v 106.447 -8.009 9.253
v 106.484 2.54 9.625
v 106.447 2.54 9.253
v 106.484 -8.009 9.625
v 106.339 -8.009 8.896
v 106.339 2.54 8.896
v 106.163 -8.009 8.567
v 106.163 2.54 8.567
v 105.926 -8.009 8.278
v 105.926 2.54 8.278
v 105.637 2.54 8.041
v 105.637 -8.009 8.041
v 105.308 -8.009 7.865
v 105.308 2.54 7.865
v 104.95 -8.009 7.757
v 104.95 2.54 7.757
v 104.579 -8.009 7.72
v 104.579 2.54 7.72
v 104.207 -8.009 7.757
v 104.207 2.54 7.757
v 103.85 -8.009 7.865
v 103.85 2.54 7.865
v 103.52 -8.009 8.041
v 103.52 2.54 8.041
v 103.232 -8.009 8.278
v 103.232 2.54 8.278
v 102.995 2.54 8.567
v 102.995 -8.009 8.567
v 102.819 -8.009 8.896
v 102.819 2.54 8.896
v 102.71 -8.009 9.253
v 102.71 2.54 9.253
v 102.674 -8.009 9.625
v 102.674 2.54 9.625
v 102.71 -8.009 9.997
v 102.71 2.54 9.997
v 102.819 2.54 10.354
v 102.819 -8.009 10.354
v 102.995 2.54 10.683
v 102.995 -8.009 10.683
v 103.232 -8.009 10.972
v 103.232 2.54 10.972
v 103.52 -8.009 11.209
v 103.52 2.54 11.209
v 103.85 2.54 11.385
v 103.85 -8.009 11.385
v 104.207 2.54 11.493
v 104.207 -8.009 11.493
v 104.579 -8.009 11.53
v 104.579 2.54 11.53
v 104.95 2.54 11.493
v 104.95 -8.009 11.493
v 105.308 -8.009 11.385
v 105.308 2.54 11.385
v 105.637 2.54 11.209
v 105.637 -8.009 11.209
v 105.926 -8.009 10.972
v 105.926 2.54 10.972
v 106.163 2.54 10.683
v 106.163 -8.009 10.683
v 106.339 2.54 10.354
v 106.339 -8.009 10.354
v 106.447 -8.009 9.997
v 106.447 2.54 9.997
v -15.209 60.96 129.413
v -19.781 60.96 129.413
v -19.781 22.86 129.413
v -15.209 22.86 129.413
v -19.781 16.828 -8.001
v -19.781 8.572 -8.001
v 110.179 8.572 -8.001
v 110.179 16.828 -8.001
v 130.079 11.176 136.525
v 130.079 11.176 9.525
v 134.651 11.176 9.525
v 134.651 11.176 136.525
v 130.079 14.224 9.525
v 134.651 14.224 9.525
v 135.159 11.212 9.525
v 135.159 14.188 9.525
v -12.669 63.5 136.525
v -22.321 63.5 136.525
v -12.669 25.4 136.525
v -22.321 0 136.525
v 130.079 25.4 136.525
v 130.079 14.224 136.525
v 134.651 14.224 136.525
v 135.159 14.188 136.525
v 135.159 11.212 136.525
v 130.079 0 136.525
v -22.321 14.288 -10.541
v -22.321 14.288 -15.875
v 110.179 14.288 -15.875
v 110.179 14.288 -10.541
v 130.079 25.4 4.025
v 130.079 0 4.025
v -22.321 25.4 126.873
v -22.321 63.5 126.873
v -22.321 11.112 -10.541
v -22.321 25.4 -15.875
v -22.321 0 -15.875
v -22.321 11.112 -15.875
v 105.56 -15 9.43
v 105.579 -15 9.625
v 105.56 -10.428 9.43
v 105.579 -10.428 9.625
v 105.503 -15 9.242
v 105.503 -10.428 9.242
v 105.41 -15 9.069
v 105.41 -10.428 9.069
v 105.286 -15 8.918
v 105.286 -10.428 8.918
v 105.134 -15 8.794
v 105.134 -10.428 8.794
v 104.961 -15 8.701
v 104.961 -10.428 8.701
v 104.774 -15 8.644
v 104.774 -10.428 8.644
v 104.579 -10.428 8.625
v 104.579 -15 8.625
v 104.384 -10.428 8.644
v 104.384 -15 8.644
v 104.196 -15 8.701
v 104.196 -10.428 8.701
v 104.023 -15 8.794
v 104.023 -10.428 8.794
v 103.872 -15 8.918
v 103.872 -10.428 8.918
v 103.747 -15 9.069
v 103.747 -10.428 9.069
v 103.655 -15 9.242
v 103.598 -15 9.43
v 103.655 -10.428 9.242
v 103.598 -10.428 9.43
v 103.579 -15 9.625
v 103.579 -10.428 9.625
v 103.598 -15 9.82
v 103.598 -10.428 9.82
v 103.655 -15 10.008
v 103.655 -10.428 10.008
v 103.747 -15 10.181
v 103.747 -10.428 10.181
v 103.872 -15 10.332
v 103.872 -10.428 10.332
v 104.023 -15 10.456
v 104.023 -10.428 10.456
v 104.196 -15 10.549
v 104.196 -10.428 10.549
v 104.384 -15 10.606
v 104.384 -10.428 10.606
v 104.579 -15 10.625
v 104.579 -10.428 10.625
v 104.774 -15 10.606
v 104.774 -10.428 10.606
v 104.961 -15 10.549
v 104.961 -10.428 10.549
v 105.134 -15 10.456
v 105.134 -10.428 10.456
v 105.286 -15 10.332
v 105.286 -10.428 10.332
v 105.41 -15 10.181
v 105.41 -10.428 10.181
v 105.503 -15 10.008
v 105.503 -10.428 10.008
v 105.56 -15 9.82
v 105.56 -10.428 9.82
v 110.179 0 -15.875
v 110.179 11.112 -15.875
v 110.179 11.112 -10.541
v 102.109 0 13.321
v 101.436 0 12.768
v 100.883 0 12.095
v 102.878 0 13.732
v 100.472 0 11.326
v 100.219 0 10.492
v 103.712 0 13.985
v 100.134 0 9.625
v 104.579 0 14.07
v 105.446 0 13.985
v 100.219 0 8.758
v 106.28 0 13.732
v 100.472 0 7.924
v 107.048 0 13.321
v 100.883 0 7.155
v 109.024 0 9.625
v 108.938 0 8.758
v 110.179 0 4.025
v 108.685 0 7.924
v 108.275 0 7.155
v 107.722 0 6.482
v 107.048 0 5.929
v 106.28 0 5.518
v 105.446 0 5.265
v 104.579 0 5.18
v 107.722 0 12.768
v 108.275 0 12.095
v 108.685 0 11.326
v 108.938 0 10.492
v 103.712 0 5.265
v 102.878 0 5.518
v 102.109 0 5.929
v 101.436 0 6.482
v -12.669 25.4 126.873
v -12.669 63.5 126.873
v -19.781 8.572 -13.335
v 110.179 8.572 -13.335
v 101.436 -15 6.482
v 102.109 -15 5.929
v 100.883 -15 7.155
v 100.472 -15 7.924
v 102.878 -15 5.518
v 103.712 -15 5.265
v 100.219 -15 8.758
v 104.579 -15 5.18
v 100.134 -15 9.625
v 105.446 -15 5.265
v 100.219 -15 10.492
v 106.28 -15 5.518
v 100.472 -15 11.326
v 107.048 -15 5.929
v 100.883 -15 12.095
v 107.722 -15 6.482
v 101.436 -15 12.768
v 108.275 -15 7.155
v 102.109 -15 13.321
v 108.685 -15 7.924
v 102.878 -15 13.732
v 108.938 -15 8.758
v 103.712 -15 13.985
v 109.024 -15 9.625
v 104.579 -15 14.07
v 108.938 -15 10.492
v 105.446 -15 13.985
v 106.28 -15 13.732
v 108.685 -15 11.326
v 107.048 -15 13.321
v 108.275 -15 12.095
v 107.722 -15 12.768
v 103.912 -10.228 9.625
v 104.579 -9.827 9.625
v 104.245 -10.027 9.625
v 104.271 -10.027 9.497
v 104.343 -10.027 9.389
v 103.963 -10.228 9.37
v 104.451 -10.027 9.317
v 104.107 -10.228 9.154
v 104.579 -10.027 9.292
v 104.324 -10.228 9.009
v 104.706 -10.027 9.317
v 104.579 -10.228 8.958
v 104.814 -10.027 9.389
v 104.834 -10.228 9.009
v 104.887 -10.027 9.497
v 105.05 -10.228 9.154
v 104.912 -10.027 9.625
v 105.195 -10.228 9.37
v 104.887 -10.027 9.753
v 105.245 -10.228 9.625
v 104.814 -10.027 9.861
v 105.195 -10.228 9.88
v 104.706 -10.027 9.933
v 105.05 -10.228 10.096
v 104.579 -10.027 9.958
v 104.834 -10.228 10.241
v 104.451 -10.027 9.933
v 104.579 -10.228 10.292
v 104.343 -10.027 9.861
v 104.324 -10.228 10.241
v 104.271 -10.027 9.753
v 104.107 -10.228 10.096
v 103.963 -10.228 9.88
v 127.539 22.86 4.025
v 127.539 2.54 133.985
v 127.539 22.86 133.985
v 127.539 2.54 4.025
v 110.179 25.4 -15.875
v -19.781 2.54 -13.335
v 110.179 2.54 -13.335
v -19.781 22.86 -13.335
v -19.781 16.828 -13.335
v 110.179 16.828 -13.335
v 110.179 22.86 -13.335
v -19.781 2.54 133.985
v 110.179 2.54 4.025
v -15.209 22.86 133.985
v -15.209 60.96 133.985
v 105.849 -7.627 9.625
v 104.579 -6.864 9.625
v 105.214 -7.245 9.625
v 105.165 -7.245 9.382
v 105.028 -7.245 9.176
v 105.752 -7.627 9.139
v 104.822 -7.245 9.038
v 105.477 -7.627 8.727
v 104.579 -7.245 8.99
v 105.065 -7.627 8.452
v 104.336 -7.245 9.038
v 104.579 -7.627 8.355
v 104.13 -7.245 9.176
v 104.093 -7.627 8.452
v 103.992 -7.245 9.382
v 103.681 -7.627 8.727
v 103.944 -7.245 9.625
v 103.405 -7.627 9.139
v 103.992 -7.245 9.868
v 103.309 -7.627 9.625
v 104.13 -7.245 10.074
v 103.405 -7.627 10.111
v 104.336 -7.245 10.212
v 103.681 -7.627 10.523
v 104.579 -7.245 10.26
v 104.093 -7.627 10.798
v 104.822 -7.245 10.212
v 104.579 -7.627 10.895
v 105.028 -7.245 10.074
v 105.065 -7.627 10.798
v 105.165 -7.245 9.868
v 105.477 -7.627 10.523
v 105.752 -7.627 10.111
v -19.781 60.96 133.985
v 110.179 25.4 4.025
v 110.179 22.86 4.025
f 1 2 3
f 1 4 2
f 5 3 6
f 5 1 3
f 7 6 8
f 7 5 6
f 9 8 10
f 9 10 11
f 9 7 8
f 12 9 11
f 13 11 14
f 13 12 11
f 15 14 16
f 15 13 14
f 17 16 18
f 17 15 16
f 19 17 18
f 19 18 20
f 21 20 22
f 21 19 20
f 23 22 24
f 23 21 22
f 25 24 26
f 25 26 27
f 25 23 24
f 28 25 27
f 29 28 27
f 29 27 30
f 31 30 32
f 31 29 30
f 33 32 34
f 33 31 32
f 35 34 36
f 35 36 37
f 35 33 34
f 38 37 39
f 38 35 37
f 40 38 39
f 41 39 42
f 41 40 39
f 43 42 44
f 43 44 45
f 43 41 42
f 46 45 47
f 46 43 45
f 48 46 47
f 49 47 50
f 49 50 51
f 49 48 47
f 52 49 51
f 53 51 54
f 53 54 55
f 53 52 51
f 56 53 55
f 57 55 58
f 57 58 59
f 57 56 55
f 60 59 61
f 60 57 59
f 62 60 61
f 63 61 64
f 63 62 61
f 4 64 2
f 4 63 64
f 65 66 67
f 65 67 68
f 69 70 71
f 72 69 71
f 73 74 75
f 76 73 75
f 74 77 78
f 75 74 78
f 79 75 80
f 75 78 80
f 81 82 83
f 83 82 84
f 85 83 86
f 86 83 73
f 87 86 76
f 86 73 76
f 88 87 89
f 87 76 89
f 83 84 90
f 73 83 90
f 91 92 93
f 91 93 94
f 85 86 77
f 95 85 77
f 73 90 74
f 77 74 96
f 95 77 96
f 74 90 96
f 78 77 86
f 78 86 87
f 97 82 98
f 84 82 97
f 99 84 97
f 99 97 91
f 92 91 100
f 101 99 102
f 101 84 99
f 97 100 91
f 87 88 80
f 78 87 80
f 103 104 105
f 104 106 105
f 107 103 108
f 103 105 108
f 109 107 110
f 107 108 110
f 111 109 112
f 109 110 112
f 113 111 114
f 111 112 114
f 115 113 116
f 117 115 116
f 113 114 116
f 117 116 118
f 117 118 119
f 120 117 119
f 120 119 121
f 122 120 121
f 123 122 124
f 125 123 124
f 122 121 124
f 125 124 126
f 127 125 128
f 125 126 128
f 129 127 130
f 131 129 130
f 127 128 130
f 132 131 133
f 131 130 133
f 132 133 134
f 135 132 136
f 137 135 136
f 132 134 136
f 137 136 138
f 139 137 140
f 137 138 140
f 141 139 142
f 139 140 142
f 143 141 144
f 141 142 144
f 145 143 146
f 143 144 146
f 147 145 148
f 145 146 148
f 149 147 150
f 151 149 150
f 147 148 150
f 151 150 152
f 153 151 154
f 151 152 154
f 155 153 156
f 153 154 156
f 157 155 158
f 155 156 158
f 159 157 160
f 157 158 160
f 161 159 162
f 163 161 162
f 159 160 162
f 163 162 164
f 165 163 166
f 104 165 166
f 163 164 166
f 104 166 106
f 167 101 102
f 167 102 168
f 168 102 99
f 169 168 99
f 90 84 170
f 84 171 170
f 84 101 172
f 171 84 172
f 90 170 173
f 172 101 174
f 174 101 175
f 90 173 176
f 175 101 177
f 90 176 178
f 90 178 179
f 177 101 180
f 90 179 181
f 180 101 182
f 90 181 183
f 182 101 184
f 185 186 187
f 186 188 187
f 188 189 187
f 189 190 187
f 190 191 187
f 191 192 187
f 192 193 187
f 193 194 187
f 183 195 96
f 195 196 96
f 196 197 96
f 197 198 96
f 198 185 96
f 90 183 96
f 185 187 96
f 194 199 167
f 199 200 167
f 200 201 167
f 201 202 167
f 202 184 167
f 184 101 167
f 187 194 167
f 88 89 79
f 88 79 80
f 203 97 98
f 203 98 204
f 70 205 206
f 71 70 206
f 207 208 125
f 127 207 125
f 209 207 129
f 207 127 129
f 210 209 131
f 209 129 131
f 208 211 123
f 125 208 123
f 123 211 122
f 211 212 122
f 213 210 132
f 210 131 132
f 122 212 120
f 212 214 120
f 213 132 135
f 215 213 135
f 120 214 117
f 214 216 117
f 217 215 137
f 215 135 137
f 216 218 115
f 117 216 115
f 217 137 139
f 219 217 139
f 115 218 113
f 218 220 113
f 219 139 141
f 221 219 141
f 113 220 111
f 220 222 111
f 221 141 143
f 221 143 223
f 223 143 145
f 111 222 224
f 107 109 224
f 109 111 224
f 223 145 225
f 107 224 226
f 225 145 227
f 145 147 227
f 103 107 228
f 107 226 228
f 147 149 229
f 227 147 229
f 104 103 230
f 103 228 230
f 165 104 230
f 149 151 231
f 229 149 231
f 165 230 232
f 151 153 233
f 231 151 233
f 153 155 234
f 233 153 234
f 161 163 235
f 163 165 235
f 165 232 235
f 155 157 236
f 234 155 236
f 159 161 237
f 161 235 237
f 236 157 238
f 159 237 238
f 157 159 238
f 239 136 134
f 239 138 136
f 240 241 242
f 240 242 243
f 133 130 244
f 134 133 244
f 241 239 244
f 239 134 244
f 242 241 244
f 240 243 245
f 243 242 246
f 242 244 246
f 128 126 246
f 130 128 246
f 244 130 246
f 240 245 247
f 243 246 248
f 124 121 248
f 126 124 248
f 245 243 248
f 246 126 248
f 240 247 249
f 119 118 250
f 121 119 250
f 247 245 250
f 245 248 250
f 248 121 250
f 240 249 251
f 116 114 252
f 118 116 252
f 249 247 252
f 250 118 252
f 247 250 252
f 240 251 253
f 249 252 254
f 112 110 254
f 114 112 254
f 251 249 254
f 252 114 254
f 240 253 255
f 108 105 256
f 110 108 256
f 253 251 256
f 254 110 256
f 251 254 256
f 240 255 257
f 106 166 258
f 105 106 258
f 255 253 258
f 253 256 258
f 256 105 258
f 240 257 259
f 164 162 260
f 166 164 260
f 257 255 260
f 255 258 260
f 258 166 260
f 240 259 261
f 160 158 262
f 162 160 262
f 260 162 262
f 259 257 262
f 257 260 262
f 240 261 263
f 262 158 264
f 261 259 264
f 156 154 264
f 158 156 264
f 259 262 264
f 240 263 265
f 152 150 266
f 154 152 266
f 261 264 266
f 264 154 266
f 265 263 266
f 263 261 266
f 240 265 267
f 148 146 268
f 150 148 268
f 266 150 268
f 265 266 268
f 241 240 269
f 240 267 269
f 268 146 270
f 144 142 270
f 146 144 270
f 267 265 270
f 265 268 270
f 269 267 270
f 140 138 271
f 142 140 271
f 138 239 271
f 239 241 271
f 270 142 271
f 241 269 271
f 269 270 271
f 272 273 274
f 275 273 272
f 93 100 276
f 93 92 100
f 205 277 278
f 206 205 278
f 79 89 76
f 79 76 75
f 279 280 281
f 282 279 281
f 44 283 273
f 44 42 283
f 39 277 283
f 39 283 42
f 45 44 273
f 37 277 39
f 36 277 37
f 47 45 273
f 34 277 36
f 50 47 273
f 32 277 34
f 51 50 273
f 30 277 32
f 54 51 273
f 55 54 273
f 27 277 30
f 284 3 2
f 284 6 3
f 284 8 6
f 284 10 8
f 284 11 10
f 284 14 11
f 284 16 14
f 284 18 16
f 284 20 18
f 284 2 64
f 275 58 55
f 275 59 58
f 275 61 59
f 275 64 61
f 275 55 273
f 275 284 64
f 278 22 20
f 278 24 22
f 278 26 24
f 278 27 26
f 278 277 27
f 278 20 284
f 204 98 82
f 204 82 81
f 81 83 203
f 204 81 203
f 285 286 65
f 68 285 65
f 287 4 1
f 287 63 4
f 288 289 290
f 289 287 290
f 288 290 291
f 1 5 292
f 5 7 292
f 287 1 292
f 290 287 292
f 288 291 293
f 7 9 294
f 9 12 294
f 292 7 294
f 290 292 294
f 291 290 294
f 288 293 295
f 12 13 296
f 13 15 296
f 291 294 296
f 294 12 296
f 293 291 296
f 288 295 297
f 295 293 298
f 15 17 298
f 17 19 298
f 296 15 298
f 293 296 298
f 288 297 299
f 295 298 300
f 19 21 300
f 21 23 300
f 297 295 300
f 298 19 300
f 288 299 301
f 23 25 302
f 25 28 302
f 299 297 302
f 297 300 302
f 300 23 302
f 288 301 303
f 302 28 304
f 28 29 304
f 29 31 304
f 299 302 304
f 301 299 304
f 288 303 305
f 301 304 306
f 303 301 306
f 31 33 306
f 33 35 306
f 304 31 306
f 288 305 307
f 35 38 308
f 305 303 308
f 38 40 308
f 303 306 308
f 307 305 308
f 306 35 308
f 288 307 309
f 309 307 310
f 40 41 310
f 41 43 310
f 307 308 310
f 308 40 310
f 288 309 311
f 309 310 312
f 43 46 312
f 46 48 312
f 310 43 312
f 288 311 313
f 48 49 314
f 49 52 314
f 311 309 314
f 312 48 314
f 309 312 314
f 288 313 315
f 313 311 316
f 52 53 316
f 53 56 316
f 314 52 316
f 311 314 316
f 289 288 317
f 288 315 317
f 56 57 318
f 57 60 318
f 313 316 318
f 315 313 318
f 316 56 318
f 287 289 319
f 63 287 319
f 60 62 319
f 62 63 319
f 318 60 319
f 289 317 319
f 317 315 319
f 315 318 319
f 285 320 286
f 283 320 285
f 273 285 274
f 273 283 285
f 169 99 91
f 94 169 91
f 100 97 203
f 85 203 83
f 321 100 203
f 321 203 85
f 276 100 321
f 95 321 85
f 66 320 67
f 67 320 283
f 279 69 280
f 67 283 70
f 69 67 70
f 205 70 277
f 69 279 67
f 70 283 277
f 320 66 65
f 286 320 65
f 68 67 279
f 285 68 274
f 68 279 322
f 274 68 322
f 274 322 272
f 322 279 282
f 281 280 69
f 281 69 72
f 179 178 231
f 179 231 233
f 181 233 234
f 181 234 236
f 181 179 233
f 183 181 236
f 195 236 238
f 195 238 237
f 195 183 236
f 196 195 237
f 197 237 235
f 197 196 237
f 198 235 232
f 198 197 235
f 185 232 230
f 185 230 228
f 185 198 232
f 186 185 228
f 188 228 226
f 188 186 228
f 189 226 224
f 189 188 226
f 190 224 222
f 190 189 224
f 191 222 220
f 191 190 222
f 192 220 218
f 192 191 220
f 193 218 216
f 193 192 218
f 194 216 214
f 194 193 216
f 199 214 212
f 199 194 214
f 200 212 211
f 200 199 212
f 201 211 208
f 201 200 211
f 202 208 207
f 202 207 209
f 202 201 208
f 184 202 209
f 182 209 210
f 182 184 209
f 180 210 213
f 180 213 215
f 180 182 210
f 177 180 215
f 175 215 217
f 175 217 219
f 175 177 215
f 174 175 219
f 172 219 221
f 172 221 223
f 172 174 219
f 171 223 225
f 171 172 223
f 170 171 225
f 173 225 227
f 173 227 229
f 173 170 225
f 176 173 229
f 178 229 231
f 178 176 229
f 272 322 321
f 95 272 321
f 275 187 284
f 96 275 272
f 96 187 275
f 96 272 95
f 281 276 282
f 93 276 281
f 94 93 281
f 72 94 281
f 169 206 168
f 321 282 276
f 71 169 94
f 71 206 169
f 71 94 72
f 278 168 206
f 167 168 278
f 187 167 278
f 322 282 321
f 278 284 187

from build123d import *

# Parameters (mm, degrees)
SKETCH1_W                 = 152.4
SKETCH1_H                 = 152.4
BOSS_EXTRUDE2_DEPTH       = 25.4
SKETCH2_W                 = 9.652
SKETCH2_H                 = 9.652
BOSS_EXTRUDE3_DEPTH       = 38.1
SKETCH3_W                 = 5.08
SKETCH3_H                 = 3.048
BOSS_EXTRUDE4_DEPTH       = 127
CHAMFER1_SIZE             = 0.508
CHAMFER1_SIZE2            = 0.03552282
CHAMFER2_SIZE             = 0.508
CHAMFER2_SIZE2            = 0.03552282
SKETCH4_W                 = 5.334
SKETCH4_H                 = 3.175
CUT_EXTRUDE3_DEPTH        = 149.86
SKETCH5_R                 = 4.445
BOSS_EXTRUDE5_DEPTH       = 15
F_2_0MM_DOWEL_HOLE1_D     = 2
F_2_0MM_DOWEL_HOLE1_DEPTH = 4.572
F_2_0MM_DOWEL_HOLE1_TIP   = 0.600860619
SHELL1_START              = 2.54
SHELL1_OUTLINE_W          = 147.32
SHELL1_OUTLINE_H          = 141.986
SHELL1_DEPTH              = 20.32
SHELL1_2_OUTLINE_W        = 147.32
SHELL1_2_OUTLINE_H        = 5.334
SHELL1_2_DEPTH            = 6.0325
SHELL1_START_2            = 16.8275
SHELL1_3_OUTLINE_W        = 147.32
SHELL1_3_OUTLINE_H        = 5.334
SHELL1_3_DEPTH            = 6.0325
SHELL1_START_3            = 22.86
SHELL1_4_OUTLINE_W        = 4.572
SHELL1_4_OUTLINE_H        = 4.572
SHELL1_4_DEPTH            = 38.1
SHELL1_START_4            = -6.863890452
SHELL1_5_OUTLINE_R        = 1.905
SHELL1_5_DEPTH            = 9.403890452
SKETCH8_W                 = 19.9
SKETCH8_H                 = 19.9
CUT_EXTRUDE4_DEPTH        = 25.4


with BuildPart() as part:
    # Sketch1 → Boss-Extrude2 (new body)
    with BuildSketch(Plane(origin=(0, 0, 0), x_dir=(1, 0, 0), z_dir=(0, 1, 0))):
        with Locations((53.878787879, -60.325)):
            Rectangle(SKETCH1_W, SKETCH1_H)
    extrude(amount=BOSS_EXTRUDE2_DEPTH)

    # Sketch2 → Boss-Extrude3 (add)
    with BuildSketch(Plane(origin=(0, 25.4, 0), x_dir=(1, 0, 0), z_dir=(0, 1, 0))):
        with Locations((-17.495212121, -131.699)):
            Rectangle(SKETCH2_W, SKETCH2_H)
    extrude(amount=BOSS_EXTRUDE3_DEPTH)

    # Sketch3 → Boss-Extrude4 (add)
    with BuildSketch(Plane.XY.offset(136.525)):
        with Locations((132.618787879, 12.7)):
            Rectangle(SKETCH3_W, SKETCH3_H)
    extrude(amount=-BOSS_EXTRUDE4_DEPTH)

    # Chamfer1
    chamfer1_edges = [part.edges().sort_by_distance(p)[0] for p in [
        (135.158787879, 14.224, 73.025),
    ]]
    chamfer1_side = [part.faces().sort_by_distance(p)[0] for p in [
        (132.618787879, 14.224, 73.025),
    ]]
    chamfer(chamfer1_edges, length=CHAMFER1_SIZE, length2=CHAMFER1_SIZE2, reference=chamfer1_side[0])

    # Chamfer2
    chamfer2_edges = [part.edges().sort_by_distance(p)[0] for p in [
        (135.158787879, 11.176, 73.025),
    ]]
    chamfer2_side = [part.faces().sort_by_distance(p)[0] for p in [
        (132.618787879, 11.176, 73.025),
    ]]
    chamfer(chamfer2_edges, length=CHAMFER2_SIZE, length2=CHAMFER2_SIZE2, reference=chamfer2_side[0])

    # Sketch4 → Cut-Extrude3 (cut)
    with BuildSketch(Plane.ZY.offset(22.321212121)):
        with Locations((-13.208, 12.7)):
            Rectangle(SKETCH4_W, SKETCH4_H)
    extrude(amount=-CUT_EXTRUDE3_DEPTH, mode=Mode.SUBTRACT)

    # Sketch5 → Boss-Extrude5 (add)
    with BuildSketch(Plane(origin=(0, 0, 0), x_dir=(1, 0, 0), z_dir=(0, 1, 0))):
        with Locations(Location((104.578787879, -9.625, 0), (0, 0, 270))):
            Circle(SKETCH5_R)
    extrude(amount=-BOSS_EXTRUDE5_DEPTH)

    # Ø2.0mm Dowel Hole1
    with Locations(Plane(origin=(0, -15, 0), x_dir=(-1, 0, 0), z_dir=(0, -1, 0))):
        with Locations((-104.578787879, -9.625)):
            Hole(F_2_0MM_DOWEL_HOLE1_D / 2, depth=F_2_0MM_DOWEL_HOLE1_DEPTH)
            with Locations((0, 0, -(F_2_0MM_DOWEL_HOLE1_DEPTH + F_2_0MM_DOWEL_HOLE1_TIP / 2))):  # 118° drill point
                Cone(0, F_2_0MM_DOWEL_HOLE1_D / 2, F_2_0MM_DOWEL_HOLE1_TIP, mode=Mode.SUBTRACT)

    # Shell1: read off the stored shape, not the designer's step
    # Shell1 outline → Shell1 (cut)
    with BuildSketch(Plane(origin=(0, 0, 0), x_dir=(1, 0, 0), z_dir=(0, 1, 0)).offset(SHELL1_START)):
        with Locations((53.878787879, -62.992)):
            Rectangle(SHELL1_OUTLINE_W, SHELL1_OUTLINE_H)
    extrude(amount=SHELL1_DEPTH, mode=Mode.SUBTRACT)

    # Shell1 2 outline → Shell1 2 (cut)
    with BuildSketch(Plane(origin=(0, 0, 0), x_dir=(1, 0, 0), z_dir=(0, 1, 0)).offset(SHELL1_START)):
        with Locations((53.878787879, 10.668)):
            Rectangle(SHELL1_2_OUTLINE_W, SHELL1_2_OUTLINE_H)
    extrude(amount=SHELL1_2_DEPTH, mode=Mode.SUBTRACT)

    # Shell1 3 outline → Shell1 3 (cut)
    with BuildSketch(Plane(origin=(0, 0, 0), x_dir=(1, 0, 0), z_dir=(0, 1, 0)).offset(SHELL1_START_2)):
        with Locations((53.878787879, 10.668)):
            Rectangle(SHELL1_3_OUTLINE_W, SHELL1_3_OUTLINE_H)
    extrude(amount=SHELL1_3_DEPTH, mode=Mode.SUBTRACT)

    # Shell1 4 outline → Shell1 4 (cut)
    with BuildSketch(Plane(origin=(0, 0, 0), x_dir=(1, 0, 0), z_dir=(0, 1, 0)).offset(SHELL1_START_3)):
        with Locations((-17.495212121, -131.699)):
            Rectangle(SHELL1_4_OUTLINE_W, SHELL1_4_OUTLINE_H)
    extrude(amount=SHELL1_4_DEPTH, mode=Mode.SUBTRACT)

    # Shell1 5 outline → Shell1 5 (cut)
    with BuildSketch(Plane(origin=(0, 0, 0), x_dir=(1, 0, 0), z_dir=(0, 1, 0)).offset(SHELL1_START_4)):
        with Locations((104.578787879, -9.625)):
            Circle(SHELL1_5_OUTLINE_R)
    extrude(amount=SHELL1_5_DEPTH, mode=Mode.SUBTRACT)

    # Shell1 6 outline → Shell1 6 (revolve, cut)
    with BuildSketch(Plane(origin=(104.578787879, 0, 9.625), x_dir=(1, 0, 0), z_dir=(0, 0, 1))):
        Polygon((0, -6.863890552), (1.905, -8.008530031), (1.905, -6.863890452), align=None)
    revolve(axis=Axis((104.578787879, 0, 9.625), (0, 1, 0)), mode=Mode.SUBTRACT)

    # Sketch8 → Cut-Extrude4 (cut)
    with BuildSketch(Plane.XZ):
        with Locations((120.128787879, -5.925)):
            Rectangle(SKETCH8_W, SKETCH8_H)
    extrude(amount=-CUT_EXTRUDE4_DEPTH, mode=Mode.SUBTRACT)


solid = part.part
